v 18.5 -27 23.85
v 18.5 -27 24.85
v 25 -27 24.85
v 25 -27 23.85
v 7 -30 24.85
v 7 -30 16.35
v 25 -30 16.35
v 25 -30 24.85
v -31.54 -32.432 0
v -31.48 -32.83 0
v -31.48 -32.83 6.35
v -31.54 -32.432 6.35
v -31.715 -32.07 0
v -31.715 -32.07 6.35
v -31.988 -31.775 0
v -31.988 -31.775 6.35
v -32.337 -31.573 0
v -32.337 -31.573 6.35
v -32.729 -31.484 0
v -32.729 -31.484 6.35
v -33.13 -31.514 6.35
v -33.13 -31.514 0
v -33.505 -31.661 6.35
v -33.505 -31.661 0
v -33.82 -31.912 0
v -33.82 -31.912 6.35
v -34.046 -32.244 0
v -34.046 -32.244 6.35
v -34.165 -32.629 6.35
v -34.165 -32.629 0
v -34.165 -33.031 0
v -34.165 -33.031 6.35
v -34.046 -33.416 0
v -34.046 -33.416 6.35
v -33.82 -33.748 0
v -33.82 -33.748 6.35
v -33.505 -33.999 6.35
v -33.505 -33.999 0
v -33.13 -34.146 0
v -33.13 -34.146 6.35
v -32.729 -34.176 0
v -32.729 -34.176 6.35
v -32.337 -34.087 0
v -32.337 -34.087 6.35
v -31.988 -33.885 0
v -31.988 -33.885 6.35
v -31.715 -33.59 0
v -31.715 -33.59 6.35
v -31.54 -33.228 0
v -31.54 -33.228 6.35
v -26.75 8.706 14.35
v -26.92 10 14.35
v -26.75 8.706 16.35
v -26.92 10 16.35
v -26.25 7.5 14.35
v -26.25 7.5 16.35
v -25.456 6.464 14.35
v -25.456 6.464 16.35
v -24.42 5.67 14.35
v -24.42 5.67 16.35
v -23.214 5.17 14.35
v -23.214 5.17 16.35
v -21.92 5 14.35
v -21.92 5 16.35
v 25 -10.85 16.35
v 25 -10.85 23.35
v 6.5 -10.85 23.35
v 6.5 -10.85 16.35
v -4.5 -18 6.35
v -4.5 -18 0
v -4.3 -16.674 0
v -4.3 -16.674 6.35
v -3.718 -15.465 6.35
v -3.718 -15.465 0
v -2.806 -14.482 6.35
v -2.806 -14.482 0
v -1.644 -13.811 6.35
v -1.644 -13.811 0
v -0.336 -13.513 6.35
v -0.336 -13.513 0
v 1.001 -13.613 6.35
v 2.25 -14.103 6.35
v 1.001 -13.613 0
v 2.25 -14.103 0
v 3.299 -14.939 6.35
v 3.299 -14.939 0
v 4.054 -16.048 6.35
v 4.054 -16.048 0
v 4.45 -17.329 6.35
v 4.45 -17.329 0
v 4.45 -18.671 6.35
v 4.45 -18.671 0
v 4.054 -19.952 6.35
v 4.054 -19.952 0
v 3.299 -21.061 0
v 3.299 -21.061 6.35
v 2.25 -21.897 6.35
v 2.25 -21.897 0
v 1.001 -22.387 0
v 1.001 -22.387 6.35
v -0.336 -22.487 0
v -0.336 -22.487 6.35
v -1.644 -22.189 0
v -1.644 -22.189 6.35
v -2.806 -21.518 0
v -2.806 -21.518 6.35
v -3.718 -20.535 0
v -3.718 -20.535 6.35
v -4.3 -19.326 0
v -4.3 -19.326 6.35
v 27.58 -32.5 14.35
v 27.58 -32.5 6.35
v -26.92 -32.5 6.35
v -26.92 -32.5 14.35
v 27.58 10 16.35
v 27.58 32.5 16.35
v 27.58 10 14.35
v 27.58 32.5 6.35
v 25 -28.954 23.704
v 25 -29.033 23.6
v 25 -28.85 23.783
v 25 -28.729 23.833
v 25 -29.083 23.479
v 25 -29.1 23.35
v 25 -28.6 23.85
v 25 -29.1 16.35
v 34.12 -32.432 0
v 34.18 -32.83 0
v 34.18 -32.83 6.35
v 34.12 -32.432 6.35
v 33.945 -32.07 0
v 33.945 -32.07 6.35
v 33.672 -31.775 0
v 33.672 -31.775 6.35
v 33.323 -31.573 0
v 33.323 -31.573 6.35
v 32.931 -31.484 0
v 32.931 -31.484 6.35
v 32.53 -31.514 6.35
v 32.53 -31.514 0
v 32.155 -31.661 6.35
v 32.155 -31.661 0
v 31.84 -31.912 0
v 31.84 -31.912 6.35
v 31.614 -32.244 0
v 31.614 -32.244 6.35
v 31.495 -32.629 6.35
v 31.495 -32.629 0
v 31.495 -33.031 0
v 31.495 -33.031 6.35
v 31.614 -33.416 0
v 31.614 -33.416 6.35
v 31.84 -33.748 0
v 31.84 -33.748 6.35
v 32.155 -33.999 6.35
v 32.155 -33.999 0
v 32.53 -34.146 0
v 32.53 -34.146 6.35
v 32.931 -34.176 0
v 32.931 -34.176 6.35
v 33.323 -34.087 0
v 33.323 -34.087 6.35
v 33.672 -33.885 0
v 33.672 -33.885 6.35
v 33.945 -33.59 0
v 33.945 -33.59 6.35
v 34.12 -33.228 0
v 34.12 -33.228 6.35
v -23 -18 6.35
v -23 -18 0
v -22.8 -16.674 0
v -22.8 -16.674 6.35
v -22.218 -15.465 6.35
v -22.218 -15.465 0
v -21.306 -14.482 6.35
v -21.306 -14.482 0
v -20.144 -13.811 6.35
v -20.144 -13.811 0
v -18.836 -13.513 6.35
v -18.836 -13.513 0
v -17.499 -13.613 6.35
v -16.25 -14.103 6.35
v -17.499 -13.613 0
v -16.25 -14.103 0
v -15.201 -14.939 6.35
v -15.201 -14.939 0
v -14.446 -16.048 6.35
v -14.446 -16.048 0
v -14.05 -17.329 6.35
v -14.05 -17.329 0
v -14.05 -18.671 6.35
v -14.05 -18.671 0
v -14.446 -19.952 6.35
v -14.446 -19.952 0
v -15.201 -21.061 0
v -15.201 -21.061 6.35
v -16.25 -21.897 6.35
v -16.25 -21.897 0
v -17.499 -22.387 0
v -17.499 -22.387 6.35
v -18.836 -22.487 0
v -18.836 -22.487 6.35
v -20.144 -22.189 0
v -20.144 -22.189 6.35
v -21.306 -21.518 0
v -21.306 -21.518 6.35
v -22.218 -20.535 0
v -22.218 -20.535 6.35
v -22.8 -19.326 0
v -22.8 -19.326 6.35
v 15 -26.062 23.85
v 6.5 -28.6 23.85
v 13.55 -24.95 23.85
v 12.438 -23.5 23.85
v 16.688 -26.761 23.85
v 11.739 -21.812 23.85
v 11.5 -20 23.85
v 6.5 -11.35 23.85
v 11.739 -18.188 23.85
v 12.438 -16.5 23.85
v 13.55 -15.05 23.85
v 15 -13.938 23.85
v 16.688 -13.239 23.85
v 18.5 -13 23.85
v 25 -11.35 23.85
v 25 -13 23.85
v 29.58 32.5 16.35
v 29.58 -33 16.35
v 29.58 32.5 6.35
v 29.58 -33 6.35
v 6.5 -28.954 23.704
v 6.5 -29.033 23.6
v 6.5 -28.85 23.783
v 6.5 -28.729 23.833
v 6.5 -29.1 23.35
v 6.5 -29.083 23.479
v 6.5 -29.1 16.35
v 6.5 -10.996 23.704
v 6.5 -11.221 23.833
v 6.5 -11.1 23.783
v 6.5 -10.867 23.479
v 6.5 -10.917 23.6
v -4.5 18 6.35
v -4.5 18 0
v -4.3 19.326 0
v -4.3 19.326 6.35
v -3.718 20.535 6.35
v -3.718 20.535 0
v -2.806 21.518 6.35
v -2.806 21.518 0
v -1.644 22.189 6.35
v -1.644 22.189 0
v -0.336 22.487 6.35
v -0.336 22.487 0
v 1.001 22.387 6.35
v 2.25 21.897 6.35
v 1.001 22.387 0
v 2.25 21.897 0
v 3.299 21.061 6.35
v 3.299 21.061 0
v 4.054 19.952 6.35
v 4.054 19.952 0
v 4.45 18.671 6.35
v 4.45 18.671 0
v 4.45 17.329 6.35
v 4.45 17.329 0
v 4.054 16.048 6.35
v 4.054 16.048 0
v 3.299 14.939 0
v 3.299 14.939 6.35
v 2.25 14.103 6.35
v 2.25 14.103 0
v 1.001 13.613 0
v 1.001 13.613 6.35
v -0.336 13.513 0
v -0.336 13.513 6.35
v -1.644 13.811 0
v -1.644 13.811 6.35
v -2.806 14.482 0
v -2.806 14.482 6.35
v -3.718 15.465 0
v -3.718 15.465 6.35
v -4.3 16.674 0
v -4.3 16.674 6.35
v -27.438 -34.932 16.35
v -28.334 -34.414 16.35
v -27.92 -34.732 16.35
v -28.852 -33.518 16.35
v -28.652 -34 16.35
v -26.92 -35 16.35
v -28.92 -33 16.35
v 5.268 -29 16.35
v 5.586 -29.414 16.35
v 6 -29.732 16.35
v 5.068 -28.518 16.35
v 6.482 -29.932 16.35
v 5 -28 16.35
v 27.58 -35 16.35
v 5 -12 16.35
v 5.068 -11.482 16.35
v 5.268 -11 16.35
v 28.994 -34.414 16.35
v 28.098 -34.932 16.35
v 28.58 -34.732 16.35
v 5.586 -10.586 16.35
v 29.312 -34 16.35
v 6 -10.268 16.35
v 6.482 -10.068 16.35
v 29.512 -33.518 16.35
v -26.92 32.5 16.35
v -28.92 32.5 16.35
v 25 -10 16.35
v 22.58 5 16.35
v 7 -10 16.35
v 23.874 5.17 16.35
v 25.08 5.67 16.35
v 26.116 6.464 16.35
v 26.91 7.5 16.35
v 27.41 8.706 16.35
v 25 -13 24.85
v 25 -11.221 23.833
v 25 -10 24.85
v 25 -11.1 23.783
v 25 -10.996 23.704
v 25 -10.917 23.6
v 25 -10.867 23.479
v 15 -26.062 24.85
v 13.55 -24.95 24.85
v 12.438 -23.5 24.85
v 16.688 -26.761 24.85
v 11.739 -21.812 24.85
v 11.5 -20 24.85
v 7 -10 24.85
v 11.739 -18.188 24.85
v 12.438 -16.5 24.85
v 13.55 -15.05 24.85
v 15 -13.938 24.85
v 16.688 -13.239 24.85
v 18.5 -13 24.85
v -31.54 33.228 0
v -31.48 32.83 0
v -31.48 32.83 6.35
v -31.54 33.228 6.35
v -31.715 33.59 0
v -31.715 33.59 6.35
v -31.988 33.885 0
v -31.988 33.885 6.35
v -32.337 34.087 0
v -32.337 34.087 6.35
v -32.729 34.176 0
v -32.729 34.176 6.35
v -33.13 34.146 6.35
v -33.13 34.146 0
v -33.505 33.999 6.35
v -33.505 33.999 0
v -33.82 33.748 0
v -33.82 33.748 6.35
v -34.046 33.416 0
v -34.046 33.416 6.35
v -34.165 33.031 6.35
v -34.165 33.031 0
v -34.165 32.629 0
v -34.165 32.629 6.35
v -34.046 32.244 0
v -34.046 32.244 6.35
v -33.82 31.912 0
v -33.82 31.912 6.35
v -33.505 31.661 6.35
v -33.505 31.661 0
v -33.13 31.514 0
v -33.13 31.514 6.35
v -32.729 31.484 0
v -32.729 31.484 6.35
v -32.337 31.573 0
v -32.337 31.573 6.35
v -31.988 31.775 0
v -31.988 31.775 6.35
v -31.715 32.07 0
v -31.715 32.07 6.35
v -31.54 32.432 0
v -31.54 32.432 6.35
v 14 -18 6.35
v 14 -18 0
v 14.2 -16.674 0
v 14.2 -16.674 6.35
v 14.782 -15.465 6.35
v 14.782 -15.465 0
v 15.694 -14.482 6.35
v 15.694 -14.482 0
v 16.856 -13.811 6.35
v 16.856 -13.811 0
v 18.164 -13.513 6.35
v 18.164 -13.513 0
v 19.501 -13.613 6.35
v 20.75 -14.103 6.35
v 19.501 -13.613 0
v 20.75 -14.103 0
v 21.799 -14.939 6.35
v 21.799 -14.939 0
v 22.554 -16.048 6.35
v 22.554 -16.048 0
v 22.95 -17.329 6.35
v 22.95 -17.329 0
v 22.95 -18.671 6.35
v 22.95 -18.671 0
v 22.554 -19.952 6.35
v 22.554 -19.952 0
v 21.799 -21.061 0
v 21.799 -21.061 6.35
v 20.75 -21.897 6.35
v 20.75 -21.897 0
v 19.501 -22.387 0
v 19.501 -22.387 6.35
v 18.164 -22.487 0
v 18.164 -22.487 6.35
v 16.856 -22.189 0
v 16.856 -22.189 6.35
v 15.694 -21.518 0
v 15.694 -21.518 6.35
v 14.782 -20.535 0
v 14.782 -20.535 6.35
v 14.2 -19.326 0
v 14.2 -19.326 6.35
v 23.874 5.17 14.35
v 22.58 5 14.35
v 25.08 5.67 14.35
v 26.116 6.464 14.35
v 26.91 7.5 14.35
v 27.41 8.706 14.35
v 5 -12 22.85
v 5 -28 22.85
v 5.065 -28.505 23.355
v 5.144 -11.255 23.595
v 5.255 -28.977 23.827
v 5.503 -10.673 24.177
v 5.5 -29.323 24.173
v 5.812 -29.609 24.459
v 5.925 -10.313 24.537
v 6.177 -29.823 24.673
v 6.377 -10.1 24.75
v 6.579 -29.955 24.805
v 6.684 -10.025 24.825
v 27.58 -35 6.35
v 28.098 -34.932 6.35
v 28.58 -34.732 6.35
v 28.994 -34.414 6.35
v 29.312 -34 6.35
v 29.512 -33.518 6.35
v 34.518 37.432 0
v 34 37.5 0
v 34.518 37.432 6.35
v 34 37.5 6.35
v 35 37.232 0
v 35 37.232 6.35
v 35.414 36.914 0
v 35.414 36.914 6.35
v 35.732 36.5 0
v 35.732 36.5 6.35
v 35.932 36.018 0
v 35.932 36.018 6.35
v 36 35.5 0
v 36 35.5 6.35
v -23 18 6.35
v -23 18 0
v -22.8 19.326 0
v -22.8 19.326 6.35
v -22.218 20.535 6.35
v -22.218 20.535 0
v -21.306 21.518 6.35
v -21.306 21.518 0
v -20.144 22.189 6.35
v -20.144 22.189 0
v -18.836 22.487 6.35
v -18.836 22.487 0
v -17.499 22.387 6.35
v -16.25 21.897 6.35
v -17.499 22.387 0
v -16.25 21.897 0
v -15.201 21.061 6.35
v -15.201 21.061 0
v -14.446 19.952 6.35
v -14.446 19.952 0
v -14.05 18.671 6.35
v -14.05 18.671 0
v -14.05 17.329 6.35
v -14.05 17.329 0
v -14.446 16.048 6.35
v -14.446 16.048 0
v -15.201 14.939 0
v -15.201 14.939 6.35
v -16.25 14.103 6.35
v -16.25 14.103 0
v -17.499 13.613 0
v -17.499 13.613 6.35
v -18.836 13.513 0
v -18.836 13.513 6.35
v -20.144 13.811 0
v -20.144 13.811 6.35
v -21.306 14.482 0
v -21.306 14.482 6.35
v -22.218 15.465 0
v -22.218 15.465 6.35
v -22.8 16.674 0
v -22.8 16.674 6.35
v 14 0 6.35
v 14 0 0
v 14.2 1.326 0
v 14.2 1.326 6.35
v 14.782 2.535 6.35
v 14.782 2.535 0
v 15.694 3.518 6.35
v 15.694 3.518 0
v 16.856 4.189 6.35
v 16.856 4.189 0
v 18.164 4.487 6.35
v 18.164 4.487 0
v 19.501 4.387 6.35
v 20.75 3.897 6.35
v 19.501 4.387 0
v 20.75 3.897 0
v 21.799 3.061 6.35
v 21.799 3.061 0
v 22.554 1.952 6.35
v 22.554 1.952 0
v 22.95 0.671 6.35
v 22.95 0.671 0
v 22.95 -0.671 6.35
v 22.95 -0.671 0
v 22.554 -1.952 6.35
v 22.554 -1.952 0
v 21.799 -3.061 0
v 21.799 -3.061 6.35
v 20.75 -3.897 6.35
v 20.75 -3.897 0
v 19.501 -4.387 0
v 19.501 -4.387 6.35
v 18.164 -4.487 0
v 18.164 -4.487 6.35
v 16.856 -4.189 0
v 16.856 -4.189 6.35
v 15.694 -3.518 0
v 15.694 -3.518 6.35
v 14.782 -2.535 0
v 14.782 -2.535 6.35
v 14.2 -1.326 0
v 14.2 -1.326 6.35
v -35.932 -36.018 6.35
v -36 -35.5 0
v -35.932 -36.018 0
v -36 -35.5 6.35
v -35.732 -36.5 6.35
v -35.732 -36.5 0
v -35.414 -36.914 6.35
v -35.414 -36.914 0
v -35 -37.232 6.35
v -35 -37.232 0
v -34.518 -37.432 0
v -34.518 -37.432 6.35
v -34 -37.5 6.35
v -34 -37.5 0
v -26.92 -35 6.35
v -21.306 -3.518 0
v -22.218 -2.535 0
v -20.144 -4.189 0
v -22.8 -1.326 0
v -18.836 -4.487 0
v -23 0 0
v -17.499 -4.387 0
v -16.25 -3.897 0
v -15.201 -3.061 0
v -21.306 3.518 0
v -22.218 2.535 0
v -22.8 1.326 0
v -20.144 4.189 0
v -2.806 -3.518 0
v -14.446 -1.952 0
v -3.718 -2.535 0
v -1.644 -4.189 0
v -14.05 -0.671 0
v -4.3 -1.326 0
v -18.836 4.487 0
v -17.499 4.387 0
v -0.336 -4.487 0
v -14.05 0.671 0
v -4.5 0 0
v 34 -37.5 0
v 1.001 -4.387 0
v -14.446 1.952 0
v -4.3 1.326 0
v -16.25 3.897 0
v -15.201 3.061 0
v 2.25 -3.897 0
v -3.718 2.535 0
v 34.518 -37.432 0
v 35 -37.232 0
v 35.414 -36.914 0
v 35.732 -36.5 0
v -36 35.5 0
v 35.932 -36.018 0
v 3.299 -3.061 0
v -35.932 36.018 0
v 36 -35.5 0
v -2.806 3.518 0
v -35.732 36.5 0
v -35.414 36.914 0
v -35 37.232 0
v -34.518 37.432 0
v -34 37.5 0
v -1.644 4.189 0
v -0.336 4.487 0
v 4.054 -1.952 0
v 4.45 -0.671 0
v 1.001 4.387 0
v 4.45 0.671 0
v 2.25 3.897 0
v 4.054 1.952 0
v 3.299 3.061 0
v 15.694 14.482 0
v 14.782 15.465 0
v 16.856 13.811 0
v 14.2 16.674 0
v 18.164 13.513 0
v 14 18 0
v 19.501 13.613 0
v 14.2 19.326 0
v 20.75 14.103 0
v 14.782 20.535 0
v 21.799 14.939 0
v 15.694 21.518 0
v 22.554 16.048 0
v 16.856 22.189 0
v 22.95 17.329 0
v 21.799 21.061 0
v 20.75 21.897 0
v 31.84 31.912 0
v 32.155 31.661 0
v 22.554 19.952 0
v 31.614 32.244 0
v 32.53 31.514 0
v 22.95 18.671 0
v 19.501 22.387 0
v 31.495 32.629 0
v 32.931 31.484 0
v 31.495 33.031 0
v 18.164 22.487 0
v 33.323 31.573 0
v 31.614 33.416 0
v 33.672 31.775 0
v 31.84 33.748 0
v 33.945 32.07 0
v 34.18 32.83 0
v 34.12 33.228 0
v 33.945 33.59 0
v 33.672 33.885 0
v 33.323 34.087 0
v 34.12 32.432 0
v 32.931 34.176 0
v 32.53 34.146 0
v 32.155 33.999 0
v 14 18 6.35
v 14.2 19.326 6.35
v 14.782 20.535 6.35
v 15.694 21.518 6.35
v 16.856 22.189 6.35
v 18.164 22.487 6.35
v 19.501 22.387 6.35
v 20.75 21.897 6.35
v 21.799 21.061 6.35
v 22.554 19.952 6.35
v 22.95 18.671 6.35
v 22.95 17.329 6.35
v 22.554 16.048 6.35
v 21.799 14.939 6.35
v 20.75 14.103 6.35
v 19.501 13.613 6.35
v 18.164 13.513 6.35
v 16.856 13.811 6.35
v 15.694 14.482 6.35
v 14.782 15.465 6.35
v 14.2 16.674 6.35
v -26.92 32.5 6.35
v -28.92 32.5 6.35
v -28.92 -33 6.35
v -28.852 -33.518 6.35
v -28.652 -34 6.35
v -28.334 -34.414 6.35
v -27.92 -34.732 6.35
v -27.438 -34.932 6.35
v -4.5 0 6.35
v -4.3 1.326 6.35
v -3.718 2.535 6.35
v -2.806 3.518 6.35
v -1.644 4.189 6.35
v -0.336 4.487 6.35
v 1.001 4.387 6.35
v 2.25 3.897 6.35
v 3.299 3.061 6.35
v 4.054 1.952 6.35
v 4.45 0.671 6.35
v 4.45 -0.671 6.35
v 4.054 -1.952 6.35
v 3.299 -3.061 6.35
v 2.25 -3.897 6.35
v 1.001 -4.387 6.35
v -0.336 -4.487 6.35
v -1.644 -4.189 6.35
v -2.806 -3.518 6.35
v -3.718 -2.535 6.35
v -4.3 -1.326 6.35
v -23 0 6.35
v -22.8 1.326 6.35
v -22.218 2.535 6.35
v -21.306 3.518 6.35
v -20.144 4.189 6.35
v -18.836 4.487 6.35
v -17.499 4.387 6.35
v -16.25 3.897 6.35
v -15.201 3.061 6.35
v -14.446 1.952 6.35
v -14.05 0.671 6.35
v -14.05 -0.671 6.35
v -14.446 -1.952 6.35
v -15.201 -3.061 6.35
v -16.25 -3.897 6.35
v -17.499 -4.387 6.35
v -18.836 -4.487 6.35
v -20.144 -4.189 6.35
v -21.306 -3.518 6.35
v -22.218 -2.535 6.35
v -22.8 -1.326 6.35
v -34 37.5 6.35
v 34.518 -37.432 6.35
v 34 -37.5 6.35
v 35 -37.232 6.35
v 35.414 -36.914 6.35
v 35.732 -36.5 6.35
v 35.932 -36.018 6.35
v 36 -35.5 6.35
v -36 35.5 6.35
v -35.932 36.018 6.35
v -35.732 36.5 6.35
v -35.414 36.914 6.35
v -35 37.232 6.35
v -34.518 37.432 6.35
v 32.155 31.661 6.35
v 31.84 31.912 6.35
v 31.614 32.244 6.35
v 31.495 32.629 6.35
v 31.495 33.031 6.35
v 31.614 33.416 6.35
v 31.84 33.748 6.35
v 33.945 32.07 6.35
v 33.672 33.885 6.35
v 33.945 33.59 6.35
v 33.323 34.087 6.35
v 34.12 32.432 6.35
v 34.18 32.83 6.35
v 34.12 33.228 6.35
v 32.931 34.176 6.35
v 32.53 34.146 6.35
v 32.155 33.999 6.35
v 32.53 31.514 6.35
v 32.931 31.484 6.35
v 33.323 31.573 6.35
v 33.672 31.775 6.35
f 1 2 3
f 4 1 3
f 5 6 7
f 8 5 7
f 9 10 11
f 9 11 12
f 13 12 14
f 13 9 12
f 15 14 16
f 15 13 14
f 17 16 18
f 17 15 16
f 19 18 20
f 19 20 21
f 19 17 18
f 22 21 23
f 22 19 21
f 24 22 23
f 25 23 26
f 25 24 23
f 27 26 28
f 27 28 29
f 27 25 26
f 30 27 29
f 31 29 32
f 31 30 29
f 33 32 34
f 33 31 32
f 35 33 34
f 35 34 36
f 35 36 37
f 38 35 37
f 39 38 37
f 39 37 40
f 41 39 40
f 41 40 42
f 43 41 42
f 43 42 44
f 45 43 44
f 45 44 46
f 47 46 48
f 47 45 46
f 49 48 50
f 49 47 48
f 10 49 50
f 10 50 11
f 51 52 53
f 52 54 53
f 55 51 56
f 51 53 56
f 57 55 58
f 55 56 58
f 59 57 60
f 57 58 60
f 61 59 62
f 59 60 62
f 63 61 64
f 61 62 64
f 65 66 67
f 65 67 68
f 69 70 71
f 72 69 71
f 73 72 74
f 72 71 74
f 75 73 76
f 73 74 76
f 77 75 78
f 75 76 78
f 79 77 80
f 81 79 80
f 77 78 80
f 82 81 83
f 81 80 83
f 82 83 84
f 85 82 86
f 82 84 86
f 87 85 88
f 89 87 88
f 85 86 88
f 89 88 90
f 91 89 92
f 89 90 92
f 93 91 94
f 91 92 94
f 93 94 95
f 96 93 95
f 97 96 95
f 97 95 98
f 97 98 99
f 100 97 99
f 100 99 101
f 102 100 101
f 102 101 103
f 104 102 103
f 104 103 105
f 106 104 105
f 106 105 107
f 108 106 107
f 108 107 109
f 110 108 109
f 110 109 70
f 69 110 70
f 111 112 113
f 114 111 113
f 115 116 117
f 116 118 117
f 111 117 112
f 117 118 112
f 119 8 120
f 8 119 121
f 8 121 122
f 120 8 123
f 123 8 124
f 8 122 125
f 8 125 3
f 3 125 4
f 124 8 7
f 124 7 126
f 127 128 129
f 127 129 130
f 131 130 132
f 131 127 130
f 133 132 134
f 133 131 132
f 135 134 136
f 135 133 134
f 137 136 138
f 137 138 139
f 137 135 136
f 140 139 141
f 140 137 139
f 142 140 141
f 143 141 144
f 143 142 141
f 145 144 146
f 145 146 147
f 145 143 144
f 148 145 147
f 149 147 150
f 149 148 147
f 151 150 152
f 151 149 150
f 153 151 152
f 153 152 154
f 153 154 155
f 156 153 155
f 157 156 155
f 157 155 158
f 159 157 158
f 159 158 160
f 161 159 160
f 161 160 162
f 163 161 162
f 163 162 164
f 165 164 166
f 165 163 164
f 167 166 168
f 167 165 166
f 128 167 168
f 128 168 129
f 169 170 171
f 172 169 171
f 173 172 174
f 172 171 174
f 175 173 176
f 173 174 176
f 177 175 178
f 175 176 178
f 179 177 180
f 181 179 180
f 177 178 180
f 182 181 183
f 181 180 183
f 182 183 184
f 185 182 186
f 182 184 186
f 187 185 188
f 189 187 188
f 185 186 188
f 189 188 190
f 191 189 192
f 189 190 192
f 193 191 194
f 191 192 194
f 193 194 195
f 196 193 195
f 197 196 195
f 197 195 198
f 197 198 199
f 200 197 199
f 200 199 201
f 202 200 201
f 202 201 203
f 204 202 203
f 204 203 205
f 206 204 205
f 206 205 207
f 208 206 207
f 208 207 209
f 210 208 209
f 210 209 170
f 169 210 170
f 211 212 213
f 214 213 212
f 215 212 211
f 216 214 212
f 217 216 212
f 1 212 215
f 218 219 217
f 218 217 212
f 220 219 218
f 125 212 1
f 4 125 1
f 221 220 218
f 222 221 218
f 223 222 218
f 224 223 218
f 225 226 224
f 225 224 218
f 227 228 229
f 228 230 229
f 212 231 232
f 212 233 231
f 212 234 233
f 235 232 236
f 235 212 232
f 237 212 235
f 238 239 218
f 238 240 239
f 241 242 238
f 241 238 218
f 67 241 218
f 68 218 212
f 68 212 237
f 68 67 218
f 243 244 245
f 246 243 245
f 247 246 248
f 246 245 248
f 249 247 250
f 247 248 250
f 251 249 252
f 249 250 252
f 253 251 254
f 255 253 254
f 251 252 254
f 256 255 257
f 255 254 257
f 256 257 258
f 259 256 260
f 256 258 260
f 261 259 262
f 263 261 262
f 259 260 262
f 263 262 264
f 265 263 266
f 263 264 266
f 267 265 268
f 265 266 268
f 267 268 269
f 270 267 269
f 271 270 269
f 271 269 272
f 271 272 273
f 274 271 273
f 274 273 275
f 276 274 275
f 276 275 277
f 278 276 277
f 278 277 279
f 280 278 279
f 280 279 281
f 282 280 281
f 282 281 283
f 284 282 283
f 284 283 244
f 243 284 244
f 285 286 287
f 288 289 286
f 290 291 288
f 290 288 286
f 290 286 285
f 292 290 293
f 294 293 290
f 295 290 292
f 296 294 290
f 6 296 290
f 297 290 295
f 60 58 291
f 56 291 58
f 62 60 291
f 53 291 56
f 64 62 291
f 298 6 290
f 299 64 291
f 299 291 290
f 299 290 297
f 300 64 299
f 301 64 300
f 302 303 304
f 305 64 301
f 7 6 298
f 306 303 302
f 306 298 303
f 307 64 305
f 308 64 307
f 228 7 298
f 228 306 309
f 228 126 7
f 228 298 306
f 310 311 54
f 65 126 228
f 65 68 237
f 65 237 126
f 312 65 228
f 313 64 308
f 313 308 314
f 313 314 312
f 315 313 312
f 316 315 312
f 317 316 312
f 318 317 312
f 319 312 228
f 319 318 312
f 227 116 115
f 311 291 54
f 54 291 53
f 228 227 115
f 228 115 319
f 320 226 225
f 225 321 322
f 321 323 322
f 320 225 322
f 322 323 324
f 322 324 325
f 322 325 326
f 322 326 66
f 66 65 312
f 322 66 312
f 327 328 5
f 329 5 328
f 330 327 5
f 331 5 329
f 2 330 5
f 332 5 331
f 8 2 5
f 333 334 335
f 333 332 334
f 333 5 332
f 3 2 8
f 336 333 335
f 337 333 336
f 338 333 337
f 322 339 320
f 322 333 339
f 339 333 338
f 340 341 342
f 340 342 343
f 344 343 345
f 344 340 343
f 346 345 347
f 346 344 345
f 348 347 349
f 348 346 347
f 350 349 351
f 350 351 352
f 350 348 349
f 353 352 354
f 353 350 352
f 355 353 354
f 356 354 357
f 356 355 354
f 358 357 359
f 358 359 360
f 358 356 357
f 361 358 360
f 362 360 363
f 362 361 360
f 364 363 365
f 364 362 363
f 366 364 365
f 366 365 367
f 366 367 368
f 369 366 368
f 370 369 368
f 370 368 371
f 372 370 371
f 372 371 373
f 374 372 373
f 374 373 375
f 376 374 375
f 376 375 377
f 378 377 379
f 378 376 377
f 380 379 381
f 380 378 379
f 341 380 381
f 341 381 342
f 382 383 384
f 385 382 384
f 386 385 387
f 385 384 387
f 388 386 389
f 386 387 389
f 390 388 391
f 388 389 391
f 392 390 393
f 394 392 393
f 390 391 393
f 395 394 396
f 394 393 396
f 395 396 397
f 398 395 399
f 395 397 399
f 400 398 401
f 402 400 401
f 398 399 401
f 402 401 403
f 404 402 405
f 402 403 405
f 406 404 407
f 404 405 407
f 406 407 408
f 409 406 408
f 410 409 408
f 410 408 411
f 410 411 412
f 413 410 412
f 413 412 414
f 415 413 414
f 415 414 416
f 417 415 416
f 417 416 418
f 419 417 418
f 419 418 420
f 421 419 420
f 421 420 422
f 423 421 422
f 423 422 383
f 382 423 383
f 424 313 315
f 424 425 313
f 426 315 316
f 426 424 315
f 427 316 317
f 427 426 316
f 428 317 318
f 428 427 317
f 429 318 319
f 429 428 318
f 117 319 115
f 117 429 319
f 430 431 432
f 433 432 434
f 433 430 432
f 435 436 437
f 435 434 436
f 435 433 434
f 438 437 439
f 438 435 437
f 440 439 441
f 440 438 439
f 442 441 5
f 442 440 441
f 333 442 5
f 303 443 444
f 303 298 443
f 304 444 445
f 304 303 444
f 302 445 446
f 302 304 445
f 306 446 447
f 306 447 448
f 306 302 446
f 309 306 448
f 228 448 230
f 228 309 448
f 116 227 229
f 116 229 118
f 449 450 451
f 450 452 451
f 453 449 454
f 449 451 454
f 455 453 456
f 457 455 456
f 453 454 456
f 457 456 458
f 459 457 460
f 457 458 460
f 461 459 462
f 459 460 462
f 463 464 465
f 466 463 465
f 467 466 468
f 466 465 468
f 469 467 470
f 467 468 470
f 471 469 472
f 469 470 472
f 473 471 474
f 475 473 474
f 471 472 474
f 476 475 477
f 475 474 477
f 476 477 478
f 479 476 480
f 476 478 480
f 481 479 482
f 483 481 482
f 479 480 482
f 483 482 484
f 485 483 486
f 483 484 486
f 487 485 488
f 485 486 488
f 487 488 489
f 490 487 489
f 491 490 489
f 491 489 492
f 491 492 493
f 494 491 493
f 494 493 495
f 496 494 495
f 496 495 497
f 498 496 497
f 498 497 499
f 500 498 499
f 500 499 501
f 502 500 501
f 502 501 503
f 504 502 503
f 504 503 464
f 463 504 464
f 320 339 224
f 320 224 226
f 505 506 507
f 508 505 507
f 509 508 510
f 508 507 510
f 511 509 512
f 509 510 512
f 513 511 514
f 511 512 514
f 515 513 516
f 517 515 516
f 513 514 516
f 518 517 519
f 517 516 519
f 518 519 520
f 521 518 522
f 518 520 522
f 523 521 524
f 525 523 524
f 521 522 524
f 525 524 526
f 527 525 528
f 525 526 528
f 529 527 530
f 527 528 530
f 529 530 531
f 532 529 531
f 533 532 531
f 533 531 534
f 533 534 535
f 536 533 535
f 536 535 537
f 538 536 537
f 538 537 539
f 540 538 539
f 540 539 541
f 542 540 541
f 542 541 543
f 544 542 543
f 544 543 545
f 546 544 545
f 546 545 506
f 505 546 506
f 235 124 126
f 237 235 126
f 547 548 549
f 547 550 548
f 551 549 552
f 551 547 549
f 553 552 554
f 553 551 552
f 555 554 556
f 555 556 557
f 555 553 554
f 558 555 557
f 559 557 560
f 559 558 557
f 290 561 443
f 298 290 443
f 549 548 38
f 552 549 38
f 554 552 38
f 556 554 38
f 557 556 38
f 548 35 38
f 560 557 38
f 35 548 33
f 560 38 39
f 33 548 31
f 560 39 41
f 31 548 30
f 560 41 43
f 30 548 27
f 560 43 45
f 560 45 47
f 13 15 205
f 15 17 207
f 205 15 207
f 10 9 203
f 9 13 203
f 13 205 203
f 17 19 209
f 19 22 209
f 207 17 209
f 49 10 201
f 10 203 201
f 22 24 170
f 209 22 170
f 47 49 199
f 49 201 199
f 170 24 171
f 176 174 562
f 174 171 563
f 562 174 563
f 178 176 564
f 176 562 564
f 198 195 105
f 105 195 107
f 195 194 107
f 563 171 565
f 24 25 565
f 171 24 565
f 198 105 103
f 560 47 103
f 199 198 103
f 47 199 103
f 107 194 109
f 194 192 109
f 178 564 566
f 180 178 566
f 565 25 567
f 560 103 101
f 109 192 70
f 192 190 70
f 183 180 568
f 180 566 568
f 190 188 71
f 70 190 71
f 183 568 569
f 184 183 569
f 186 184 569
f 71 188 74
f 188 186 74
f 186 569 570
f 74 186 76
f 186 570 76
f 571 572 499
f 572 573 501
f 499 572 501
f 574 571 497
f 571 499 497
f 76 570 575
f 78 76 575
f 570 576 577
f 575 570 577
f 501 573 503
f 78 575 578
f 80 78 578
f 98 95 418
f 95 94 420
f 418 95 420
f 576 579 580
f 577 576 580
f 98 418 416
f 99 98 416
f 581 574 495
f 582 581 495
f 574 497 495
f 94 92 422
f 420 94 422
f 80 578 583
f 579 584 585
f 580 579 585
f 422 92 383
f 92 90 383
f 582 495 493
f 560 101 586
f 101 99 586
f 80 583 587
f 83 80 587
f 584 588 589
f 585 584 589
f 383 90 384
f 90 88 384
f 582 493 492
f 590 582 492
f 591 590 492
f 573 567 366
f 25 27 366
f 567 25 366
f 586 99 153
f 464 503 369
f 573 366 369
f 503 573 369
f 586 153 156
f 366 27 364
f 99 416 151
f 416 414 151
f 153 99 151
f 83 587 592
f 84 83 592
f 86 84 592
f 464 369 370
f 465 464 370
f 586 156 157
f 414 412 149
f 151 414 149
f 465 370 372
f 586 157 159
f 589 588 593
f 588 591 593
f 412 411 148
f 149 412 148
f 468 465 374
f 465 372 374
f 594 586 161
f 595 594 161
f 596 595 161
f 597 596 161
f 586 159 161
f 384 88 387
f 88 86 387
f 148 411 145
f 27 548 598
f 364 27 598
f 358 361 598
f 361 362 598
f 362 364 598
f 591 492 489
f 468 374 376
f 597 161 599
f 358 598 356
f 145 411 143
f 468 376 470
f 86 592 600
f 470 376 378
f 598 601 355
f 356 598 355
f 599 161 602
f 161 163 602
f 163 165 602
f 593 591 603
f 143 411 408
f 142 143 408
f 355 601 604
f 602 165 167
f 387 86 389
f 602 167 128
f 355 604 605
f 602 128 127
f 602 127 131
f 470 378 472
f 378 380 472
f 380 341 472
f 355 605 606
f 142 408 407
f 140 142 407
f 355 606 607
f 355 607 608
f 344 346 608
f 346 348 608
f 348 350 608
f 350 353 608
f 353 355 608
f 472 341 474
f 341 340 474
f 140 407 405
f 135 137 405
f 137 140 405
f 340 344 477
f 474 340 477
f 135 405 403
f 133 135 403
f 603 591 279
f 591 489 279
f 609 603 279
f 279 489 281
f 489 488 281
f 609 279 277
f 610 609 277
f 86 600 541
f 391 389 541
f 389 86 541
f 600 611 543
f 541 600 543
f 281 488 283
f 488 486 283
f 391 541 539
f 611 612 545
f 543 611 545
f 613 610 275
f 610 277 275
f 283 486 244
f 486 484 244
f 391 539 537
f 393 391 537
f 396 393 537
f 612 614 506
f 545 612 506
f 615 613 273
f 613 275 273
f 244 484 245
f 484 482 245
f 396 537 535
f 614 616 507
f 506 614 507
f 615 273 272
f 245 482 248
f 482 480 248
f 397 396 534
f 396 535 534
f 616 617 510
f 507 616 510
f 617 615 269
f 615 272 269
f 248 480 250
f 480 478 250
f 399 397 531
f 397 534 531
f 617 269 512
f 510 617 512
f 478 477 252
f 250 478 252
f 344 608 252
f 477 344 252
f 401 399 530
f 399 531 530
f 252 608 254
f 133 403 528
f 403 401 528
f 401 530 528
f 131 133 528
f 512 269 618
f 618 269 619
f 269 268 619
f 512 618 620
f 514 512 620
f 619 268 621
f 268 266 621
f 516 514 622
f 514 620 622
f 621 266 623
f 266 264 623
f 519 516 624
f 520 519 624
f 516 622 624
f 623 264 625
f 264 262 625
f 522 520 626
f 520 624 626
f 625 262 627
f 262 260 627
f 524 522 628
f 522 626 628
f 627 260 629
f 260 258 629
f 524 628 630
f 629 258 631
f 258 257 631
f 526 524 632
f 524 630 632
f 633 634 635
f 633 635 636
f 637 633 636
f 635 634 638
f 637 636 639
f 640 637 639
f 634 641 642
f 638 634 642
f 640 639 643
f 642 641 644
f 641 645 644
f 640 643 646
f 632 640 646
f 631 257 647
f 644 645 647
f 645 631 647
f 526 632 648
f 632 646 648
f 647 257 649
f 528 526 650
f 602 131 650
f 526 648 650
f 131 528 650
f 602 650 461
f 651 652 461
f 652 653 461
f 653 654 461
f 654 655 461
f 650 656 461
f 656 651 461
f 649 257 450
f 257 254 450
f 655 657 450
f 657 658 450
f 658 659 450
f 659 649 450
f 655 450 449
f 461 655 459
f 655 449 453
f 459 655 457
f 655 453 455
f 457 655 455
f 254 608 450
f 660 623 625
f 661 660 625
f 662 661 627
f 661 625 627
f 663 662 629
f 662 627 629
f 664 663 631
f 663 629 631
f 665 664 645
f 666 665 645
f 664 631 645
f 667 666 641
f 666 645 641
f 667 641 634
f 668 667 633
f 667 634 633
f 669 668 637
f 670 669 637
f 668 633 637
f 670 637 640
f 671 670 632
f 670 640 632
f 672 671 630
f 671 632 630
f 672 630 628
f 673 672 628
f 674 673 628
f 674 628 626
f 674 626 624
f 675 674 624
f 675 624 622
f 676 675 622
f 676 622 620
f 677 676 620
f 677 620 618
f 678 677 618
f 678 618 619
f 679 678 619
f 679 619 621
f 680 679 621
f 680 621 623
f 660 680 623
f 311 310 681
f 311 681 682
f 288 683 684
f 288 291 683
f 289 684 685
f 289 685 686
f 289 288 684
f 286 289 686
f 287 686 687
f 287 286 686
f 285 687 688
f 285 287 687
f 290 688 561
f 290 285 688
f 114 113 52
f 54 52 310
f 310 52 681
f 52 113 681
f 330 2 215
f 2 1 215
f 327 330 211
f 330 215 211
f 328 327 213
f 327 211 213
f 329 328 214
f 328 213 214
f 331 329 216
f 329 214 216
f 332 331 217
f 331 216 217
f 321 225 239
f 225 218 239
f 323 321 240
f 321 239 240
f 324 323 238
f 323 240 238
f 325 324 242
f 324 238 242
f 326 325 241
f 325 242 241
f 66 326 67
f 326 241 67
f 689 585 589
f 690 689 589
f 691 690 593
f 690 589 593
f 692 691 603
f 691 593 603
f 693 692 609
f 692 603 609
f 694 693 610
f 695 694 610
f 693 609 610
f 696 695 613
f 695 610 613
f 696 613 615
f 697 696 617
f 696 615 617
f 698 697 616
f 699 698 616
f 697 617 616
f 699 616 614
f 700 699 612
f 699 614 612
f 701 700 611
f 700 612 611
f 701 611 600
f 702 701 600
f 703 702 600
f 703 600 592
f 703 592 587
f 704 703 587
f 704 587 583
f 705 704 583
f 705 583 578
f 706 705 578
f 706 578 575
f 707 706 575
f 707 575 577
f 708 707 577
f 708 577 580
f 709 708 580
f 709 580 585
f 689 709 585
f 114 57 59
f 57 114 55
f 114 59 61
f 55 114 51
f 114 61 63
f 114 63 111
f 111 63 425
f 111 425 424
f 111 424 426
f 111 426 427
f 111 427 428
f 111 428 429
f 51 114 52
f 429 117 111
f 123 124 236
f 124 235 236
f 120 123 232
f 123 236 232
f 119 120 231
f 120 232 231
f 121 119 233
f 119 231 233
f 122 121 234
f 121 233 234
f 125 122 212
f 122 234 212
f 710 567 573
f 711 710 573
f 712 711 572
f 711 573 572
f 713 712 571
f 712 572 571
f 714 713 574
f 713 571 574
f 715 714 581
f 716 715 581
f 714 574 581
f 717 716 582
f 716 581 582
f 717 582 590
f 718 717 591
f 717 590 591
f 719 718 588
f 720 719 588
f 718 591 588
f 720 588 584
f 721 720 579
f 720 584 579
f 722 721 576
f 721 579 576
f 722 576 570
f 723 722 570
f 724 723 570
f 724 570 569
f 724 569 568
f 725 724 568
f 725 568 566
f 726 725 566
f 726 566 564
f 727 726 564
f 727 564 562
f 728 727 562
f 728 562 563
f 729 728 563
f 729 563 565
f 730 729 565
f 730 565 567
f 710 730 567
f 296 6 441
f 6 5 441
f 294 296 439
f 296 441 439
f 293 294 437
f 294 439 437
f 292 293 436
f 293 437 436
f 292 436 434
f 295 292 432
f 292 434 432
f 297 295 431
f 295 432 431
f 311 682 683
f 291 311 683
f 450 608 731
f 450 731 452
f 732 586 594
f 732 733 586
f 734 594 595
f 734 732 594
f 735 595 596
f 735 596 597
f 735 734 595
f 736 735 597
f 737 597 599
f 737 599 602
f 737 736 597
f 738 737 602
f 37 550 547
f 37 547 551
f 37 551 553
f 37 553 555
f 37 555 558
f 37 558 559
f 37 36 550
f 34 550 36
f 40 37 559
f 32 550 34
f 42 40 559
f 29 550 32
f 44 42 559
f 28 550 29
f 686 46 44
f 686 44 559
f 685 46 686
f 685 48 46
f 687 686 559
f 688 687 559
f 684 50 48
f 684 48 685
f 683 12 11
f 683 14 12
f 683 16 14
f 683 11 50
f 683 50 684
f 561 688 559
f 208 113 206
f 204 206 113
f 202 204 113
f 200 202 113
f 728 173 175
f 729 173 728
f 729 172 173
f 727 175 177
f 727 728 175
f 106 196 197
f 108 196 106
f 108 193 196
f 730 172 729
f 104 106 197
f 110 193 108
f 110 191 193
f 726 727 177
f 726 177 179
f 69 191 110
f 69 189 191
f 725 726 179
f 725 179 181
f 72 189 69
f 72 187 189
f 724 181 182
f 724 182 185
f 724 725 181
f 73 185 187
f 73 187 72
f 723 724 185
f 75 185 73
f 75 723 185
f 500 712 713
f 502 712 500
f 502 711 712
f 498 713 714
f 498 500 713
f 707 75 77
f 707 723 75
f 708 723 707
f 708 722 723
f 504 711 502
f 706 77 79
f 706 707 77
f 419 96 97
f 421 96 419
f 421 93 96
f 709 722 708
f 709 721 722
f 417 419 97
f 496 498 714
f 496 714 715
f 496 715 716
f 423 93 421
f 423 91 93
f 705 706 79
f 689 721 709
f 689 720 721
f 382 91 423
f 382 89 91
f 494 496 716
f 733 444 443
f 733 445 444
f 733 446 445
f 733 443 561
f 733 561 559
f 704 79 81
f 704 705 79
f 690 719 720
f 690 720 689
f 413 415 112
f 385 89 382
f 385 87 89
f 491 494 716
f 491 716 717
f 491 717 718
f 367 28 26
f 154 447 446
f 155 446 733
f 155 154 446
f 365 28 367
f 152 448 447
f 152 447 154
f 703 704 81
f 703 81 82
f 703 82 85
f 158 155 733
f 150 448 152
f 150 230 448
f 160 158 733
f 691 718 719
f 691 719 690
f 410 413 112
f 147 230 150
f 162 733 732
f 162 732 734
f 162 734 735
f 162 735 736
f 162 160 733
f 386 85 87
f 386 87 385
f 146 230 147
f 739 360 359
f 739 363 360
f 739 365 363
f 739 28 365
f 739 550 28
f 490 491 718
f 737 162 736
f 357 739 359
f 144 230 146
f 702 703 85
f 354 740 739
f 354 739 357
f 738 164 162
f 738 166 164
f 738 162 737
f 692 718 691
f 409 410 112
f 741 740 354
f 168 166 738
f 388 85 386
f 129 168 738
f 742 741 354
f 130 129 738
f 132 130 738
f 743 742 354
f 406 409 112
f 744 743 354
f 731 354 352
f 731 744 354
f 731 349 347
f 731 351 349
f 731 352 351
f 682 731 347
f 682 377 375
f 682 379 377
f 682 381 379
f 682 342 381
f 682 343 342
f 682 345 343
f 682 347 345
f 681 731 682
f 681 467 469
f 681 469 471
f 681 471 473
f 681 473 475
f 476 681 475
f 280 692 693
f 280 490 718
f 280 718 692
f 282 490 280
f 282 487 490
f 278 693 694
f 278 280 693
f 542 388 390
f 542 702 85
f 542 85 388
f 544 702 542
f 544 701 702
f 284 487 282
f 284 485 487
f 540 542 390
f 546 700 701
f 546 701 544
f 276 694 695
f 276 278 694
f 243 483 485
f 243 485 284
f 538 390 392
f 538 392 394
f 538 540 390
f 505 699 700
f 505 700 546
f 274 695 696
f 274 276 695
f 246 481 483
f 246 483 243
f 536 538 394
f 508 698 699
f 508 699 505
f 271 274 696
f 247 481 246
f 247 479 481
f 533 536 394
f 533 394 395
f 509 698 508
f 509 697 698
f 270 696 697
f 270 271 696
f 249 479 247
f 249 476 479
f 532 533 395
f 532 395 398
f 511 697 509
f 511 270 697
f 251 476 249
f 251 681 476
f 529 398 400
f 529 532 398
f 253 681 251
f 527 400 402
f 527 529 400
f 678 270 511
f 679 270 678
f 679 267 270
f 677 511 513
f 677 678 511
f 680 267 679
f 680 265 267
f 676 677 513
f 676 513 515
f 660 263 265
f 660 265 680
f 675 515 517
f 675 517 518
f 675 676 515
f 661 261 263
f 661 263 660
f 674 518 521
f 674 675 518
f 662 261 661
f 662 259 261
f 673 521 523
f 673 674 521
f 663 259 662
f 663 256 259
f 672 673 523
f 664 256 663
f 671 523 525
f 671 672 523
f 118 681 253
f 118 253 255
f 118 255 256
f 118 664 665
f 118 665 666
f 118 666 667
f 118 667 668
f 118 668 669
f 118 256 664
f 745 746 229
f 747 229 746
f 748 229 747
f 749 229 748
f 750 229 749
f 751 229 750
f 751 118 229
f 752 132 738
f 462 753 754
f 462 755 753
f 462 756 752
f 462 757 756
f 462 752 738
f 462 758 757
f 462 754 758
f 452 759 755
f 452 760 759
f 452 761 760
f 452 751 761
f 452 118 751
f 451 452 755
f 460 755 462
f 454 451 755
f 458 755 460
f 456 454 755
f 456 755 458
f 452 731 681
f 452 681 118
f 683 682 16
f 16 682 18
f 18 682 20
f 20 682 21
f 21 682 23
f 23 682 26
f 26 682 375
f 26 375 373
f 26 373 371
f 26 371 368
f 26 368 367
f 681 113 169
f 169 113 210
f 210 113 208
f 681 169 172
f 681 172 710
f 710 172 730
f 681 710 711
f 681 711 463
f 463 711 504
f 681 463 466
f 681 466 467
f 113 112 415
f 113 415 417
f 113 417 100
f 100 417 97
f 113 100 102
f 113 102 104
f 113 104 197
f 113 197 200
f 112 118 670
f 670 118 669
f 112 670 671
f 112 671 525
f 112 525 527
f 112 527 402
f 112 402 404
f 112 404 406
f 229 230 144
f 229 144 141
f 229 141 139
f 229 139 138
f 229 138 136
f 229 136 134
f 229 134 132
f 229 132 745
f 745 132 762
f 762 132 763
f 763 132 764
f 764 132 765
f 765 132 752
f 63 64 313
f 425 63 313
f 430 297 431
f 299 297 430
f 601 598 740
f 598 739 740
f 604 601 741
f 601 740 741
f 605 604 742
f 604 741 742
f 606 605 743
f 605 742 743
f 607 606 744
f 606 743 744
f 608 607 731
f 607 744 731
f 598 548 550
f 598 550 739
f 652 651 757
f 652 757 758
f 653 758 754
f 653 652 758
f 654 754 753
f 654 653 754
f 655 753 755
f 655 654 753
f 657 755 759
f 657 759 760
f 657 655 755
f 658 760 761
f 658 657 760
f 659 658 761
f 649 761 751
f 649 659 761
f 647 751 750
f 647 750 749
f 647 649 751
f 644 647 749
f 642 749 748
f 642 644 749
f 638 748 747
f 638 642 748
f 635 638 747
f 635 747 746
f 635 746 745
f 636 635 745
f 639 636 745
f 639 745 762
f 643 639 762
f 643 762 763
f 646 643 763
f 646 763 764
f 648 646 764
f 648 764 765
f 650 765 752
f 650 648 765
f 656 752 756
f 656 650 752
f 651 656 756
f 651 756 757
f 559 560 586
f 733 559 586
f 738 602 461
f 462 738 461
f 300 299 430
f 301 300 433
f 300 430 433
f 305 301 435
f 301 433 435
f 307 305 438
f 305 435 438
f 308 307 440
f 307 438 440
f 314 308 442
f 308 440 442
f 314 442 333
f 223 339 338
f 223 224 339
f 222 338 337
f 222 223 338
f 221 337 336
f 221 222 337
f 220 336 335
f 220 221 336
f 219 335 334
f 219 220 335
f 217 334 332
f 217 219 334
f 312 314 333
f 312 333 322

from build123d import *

# Parameters (mm, degrees)
SKETCH1_W           = 72
SKETCH1_H           = 75
SKETCH1_R           = 1.35
BOSS_EXTRUDE1_DEPTH = 6.35
BOSS_EXTRUDE2_DEPTH = 10
SKETCH3_W           = 58.5
SKETCH3_H           = 40
BOSS_EXTRUDE3_DEPTH = 2
FILLET1_R           = 5
SKETCH4_W           = 20
SKETCH4_H           = 20
BOSS_EXTRUDE4_DEPTH = 8.5
SKETCH5_W           = 7.5
SKETCH5_H           = 18.25
CUT_EXTRUDE1_DEPTH  = 18.5
FILLET2_R           = 0.5
FILLET3_R           = 2
FILLET4_R           = 2
CUT_EXTRUDE2_REACH  = 59.617
SKETCH6_W           = 13.5
SKETCH6_H           = 14
FILLET5_R           = 7
CUT_EXTRUDE3_REACH  = 59.617
SKETCH7_R           = 4.5


with BuildPart() as part:
    # Sketch1 → Boss-Extrude1 (new body)
    with BuildSketch(Plane.XY):
        Rectangle(SKETCH1_W, SKETCH1_H)
        with Locations((-32.83, 32.83)):
            Circle(SKETCH1_R, mode=Mode.SUBTRACT)
        with Locations((-32.83, -32.83)):
            Circle(SKETCH1_R, mode=Mode.SUBTRACT)
        with Locations((32.83, 32.83)):
            Circle(SKETCH1_R, mode=Mode.SUBTRACT)
        with Locations((32.83, -32.83)):
            Circle(SKETCH1_R, mode=Mode.SUBTRACT)
    extrude(amount=BOSS_EXTRUDE1_DEPTH)

    # Sketch2 → Boss-Extrude2 (add)
    with BuildSketch(Plane.XY.offset(6.35)):
        Polygon((-26.92, 32.5), (-28.92, 32.5), (-28.92, -35), (29.58, -35), (29.58, 32.5), (27.58, 32.5), (27.58, -32.5), (-26.92, -32.5), align=None)
    extrude(amount=BOSS_EXTRUDE2_DEPTH)

    # Sketch3 → Boss-Extrude3 (add)
    with BuildSketch(Plane.XY.offset(16.35)):
        with Locations((0.33, -15)):
            Rectangle(SKETCH3_W, SKETCH3_H)
    extrude(amount=-BOSS_EXTRUDE3_DEPTH)

    # Fillet1
    fillet1_edges = [part.edges().sort_by_distance(p)[0] for p in [
        (-26.92, 5, 15.35),
        (27.58, 5, 15.35),
    ]]
    fillet(fillet1_edges, radius=FILLET1_R)

    # Sketch4 → Boss-Extrude4 (add)
    with BuildSketch(Plane.XY.offset(16.35)):
        with Locations((15, -20)):
            Rectangle(SKETCH4_W, SKETCH4_H)
    extrude(amount=BOSS_EXTRUDE4_DEPTH)

    # Sketch5 → Cut-Extrude1 (cut)
    with BuildSketch(Plane(origin=(25, 0, 0), x_dir=(0, 0, -1), z_dir=(1, 0, 0))):
        with Locations((-20.1, -19.975)):
            Rectangle(SKETCH5_W, SKETCH5_H)
    extrude(amount=-CUT_EXTRUDE1_DEPTH, mode=Mode.SUBTRACT)

    # Fillet2
    fillet2_edges = [part.edges().sort_by_distance(p)[0] for p in [
        (15.75, -29.1, 23.85),
        (15.75, -10.85, 23.85),
    ]]
    fillet(fillet2_edges, radius=FILLET2_R)

    # Fillet3
    fillet3_edges = [part.edges().sort_by_distance(p)[0] for p in [
        (-28.92, -35, 11.35),
        (29.58, -35, 11.35),
        (36, -37.5, 3.175),
        (-36, -37.5, 3.175),
        (-36, 37.5, 3.175),
        (36, 37.5, 3.175),
    ]]
    fillet(fillet3_edges, radius=FILLET3_R)

    # Fillet4
    fillet4_edges = [part.edges().sort_by_distance(p)[0] for p in [
        (5, -10, 20.6),
        (5, -30, 20.6),
        (5, -20, 24.85),
    ]]
    fillet(fillet4_edges, radius=FILLET4_R)

    # Sketch6 → Cut-Extrude2 (cut, up to next)
    with BuildSketch(Plane.XY.offset(24.85), mode=Mode.PRIVATE) as cut_extrude2_sk1:
        with Locations((18.25, -20)):
            Rectangle(SKETCH6_W, SKETCH6_H)
    cut_extrude2_tool1 = extrude(cut_extrude2_sk1.sketch, amount=-CUT_EXTRUDE2_REACH, mode=Mode.PRIVATE) & part.part
    add(cut_extrude2_tool1.solids().sort_by_distance((18.25, -20, 24.85))[0], mode=Mode.SUBTRACT)

    # Fillet5
    fillet5_edges = [part.edges().sort_by_distance(p)[0] for p in [
        (11.5, -27, 24.35),
        (11.5, -13, 24.35),
    ]]
    fillet(fillet5_edges, radius=FILLET5_R - 0.0001)  # a hair under: the kernel refuses the full size

    # Sketch7 → Cut-Extrude3 (cut, up to next)
    with BuildSketch(Plane(origin=(0, 0, 0), x_dir=(-1, 0, 0), z_dir=(0, 0, -1)), mode=Mode.PRIVATE) as cut_extrude3_sk1:
        with Locations((-18.5, 18)):
            Circle(SKETCH7_R)
    cut_extrude3_tool1 = extrude(cut_extrude3_sk1.sketch, amount=-CUT_EXTRUDE3_REACH, mode=Mode.PRIVATE) & part.part
    # Sketch7 → Cut-Extrude3 (cut, up to next)
    with BuildSketch(Plane(origin=(0, 0, 0), x_dir=(-1, 0, 0), z_dir=(0, 0, -1)), mode=Mode.PRIVATE) as cut_extrude3_sk2:
        with Locations((0, 18)):
            Circle(SKETCH7_R)
    cut_extrude3_tool2 = extrude(cut_extrude3_sk2.sketch, amount=-CUT_EXTRUDE3_REACH, mode=Mode.PRIVATE) & part.part
    # Sketch7 → Cut-Extrude3 (cut, up to next)
    with BuildSketch(Plane(origin=(0, 0, 0), x_dir=(-1, 0, 0), z_dir=(0, 0, -1)), mode=Mode.PRIVATE) as cut_extrude3_sk3:
        with Locations((18.5, 18)):
            Circle(SKETCH7_R)
    cut_extrude3_tool3 = extrude(cut_extrude3_sk3.sketch, amount=-CUT_EXTRUDE3_REACH, mode=Mode.PRIVATE) & part.part
    # Sketch7 → Cut-Extrude3 (cut, up to next)
    with BuildSketch(Plane(origin=(0, 0, 0), x_dir=(-1, 0, 0), z_dir=(0, 0, -1)), mode=Mode.PRIVATE) as cut_extrude3_sk4:
        with Locations((-18.5, 0)):
            Circle(SKETCH7_R)
    cut_extrude3_tool4 = extrude(cut_extrude3_sk4.sketch, amount=-CUT_EXTRUDE3_REACH, mode=Mode.PRIVATE) & part.part
    # Sketch7 → Cut-Extrude3 (cut, up to next)
    with BuildSketch(Plane(origin=(0, 0, 0), x_dir=(-1, 0, 0), z_dir=(0, 0, -1)), mode=Mode.PRIVATE) as cut_extrude3_sk5:
        Circle(SKETCH7_R)
    cut_extrude3_tool5 = extrude(cut_extrude3_sk5.sketch, amount=-CUT_EXTRUDE3_REACH, mode=Mode.PRIVATE) & part.part
    # Sketch7 → Cut-Extrude3 (cut, up to next)
    with BuildSketch(Plane(origin=(0, 0, 0), x_dir=(-1, 0, 0), z_dir=(0, 0, -1)), mode=Mode.PRIVATE) as cut_extrude3_sk6:
        with Locations((18.5, 0)):
            Circle(SKETCH7_R)
    cut_extrude3_tool6 = extrude(cut_extrude3_sk6.sketch, amount=-CUT_EXTRUDE3_REACH, mode=Mode.PRIVATE) & part.part
    # Sketch7 → Cut-Extrude3 (cut, up to next)
    with BuildSketch(Plane(origin=(0, 0, 0), x_dir=(-1, 0, 0), z_dir=(0, 0, -1)), mode=Mode.PRIVATE) as cut_extrude3_sk7:
        with Locations((0, -18)):
            Circle(SKETCH7_R)
    cut_extrude3_tool7 = extrude(cut_extrude3_sk7.sketch, amount=-CUT_EXTRUDE3_REACH, mode=Mode.PRIVATE) & part.part
    # Sketch7 → Cut-Extrude3 (cut, up to next)
    with BuildSketch(Plane(origin=(0, 0, 0), x_dir=(-1, 0, 0), z_dir=(0, 0, -1)), mode=Mode.PRIVATE) as cut_extrude3_sk8:
        with Locations((18.5, -18)):
            Circle(SKETCH7_R)
    cut_extrude3_tool8 = extrude(cut_extrude3_sk8.sketch, amount=-CUT_EXTRUDE3_REACH, mode=Mode.PRIVATE) & part.part
    # Sketch7 → Cut-Extrude3 (cut, up to next)
    with BuildSketch(Plane(origin=(0, 0, 0), x_dir=(-1, 0, 0), z_dir=(0, 0, -1)), mode=Mode.PRIVATE) as cut_extrude3_sk9:
        with Locations((-18.5, -18)):
            Circle(SKETCH7_R)
    cut_extrude3_tool9 = extrude(cut_extrude3_sk9.sketch, amount=-CUT_EXTRUDE3_REACH, mode=Mode.PRIVATE) & part.part
    add(cut_extrude3_tool1.solids().sort_by_distance((18.5, 18, 0))[0], mode=Mode.SUBTRACT)
    add(cut_extrude3_tool2.solids().sort_by_distance((0, 18, 0))[0], mode=Mode.SUBTRACT)
    add(cut_extrude3_tool3.solids().sort_by_distance((-18.5, 18, 0))[0], mode=Mode.SUBTRACT)
    add(cut_extrude3_tool4.solids().sort_by_distance((18.5, 0, 0))[0], mode=Mode.SUBTRACT)
    add(cut_extrude3_tool5.solids().sort_by_distance((0, 0, 0))[0], mode=Mode.SUBTRACT)
    add(cut_extrude3_tool6.solids().sort_by_distance((-18.5, 0, 0))[0], mode=Mode.SUBTRACT)
    add(cut_extrude3_tool7.solids().sort_by_distance((0, -18, 0))[0], mode=Mode.SUBTRACT)
    add(cut_extrude3_tool8.solids().sort_by_distance((-18.5, -18, 0))[0], mode=Mode.SUBTRACT)
    add(cut_extrude3_tool9.solids().sort_by_distance((18.5, -18, 0))[0], mode=Mode.SUBTRACT)


solid = part.part
